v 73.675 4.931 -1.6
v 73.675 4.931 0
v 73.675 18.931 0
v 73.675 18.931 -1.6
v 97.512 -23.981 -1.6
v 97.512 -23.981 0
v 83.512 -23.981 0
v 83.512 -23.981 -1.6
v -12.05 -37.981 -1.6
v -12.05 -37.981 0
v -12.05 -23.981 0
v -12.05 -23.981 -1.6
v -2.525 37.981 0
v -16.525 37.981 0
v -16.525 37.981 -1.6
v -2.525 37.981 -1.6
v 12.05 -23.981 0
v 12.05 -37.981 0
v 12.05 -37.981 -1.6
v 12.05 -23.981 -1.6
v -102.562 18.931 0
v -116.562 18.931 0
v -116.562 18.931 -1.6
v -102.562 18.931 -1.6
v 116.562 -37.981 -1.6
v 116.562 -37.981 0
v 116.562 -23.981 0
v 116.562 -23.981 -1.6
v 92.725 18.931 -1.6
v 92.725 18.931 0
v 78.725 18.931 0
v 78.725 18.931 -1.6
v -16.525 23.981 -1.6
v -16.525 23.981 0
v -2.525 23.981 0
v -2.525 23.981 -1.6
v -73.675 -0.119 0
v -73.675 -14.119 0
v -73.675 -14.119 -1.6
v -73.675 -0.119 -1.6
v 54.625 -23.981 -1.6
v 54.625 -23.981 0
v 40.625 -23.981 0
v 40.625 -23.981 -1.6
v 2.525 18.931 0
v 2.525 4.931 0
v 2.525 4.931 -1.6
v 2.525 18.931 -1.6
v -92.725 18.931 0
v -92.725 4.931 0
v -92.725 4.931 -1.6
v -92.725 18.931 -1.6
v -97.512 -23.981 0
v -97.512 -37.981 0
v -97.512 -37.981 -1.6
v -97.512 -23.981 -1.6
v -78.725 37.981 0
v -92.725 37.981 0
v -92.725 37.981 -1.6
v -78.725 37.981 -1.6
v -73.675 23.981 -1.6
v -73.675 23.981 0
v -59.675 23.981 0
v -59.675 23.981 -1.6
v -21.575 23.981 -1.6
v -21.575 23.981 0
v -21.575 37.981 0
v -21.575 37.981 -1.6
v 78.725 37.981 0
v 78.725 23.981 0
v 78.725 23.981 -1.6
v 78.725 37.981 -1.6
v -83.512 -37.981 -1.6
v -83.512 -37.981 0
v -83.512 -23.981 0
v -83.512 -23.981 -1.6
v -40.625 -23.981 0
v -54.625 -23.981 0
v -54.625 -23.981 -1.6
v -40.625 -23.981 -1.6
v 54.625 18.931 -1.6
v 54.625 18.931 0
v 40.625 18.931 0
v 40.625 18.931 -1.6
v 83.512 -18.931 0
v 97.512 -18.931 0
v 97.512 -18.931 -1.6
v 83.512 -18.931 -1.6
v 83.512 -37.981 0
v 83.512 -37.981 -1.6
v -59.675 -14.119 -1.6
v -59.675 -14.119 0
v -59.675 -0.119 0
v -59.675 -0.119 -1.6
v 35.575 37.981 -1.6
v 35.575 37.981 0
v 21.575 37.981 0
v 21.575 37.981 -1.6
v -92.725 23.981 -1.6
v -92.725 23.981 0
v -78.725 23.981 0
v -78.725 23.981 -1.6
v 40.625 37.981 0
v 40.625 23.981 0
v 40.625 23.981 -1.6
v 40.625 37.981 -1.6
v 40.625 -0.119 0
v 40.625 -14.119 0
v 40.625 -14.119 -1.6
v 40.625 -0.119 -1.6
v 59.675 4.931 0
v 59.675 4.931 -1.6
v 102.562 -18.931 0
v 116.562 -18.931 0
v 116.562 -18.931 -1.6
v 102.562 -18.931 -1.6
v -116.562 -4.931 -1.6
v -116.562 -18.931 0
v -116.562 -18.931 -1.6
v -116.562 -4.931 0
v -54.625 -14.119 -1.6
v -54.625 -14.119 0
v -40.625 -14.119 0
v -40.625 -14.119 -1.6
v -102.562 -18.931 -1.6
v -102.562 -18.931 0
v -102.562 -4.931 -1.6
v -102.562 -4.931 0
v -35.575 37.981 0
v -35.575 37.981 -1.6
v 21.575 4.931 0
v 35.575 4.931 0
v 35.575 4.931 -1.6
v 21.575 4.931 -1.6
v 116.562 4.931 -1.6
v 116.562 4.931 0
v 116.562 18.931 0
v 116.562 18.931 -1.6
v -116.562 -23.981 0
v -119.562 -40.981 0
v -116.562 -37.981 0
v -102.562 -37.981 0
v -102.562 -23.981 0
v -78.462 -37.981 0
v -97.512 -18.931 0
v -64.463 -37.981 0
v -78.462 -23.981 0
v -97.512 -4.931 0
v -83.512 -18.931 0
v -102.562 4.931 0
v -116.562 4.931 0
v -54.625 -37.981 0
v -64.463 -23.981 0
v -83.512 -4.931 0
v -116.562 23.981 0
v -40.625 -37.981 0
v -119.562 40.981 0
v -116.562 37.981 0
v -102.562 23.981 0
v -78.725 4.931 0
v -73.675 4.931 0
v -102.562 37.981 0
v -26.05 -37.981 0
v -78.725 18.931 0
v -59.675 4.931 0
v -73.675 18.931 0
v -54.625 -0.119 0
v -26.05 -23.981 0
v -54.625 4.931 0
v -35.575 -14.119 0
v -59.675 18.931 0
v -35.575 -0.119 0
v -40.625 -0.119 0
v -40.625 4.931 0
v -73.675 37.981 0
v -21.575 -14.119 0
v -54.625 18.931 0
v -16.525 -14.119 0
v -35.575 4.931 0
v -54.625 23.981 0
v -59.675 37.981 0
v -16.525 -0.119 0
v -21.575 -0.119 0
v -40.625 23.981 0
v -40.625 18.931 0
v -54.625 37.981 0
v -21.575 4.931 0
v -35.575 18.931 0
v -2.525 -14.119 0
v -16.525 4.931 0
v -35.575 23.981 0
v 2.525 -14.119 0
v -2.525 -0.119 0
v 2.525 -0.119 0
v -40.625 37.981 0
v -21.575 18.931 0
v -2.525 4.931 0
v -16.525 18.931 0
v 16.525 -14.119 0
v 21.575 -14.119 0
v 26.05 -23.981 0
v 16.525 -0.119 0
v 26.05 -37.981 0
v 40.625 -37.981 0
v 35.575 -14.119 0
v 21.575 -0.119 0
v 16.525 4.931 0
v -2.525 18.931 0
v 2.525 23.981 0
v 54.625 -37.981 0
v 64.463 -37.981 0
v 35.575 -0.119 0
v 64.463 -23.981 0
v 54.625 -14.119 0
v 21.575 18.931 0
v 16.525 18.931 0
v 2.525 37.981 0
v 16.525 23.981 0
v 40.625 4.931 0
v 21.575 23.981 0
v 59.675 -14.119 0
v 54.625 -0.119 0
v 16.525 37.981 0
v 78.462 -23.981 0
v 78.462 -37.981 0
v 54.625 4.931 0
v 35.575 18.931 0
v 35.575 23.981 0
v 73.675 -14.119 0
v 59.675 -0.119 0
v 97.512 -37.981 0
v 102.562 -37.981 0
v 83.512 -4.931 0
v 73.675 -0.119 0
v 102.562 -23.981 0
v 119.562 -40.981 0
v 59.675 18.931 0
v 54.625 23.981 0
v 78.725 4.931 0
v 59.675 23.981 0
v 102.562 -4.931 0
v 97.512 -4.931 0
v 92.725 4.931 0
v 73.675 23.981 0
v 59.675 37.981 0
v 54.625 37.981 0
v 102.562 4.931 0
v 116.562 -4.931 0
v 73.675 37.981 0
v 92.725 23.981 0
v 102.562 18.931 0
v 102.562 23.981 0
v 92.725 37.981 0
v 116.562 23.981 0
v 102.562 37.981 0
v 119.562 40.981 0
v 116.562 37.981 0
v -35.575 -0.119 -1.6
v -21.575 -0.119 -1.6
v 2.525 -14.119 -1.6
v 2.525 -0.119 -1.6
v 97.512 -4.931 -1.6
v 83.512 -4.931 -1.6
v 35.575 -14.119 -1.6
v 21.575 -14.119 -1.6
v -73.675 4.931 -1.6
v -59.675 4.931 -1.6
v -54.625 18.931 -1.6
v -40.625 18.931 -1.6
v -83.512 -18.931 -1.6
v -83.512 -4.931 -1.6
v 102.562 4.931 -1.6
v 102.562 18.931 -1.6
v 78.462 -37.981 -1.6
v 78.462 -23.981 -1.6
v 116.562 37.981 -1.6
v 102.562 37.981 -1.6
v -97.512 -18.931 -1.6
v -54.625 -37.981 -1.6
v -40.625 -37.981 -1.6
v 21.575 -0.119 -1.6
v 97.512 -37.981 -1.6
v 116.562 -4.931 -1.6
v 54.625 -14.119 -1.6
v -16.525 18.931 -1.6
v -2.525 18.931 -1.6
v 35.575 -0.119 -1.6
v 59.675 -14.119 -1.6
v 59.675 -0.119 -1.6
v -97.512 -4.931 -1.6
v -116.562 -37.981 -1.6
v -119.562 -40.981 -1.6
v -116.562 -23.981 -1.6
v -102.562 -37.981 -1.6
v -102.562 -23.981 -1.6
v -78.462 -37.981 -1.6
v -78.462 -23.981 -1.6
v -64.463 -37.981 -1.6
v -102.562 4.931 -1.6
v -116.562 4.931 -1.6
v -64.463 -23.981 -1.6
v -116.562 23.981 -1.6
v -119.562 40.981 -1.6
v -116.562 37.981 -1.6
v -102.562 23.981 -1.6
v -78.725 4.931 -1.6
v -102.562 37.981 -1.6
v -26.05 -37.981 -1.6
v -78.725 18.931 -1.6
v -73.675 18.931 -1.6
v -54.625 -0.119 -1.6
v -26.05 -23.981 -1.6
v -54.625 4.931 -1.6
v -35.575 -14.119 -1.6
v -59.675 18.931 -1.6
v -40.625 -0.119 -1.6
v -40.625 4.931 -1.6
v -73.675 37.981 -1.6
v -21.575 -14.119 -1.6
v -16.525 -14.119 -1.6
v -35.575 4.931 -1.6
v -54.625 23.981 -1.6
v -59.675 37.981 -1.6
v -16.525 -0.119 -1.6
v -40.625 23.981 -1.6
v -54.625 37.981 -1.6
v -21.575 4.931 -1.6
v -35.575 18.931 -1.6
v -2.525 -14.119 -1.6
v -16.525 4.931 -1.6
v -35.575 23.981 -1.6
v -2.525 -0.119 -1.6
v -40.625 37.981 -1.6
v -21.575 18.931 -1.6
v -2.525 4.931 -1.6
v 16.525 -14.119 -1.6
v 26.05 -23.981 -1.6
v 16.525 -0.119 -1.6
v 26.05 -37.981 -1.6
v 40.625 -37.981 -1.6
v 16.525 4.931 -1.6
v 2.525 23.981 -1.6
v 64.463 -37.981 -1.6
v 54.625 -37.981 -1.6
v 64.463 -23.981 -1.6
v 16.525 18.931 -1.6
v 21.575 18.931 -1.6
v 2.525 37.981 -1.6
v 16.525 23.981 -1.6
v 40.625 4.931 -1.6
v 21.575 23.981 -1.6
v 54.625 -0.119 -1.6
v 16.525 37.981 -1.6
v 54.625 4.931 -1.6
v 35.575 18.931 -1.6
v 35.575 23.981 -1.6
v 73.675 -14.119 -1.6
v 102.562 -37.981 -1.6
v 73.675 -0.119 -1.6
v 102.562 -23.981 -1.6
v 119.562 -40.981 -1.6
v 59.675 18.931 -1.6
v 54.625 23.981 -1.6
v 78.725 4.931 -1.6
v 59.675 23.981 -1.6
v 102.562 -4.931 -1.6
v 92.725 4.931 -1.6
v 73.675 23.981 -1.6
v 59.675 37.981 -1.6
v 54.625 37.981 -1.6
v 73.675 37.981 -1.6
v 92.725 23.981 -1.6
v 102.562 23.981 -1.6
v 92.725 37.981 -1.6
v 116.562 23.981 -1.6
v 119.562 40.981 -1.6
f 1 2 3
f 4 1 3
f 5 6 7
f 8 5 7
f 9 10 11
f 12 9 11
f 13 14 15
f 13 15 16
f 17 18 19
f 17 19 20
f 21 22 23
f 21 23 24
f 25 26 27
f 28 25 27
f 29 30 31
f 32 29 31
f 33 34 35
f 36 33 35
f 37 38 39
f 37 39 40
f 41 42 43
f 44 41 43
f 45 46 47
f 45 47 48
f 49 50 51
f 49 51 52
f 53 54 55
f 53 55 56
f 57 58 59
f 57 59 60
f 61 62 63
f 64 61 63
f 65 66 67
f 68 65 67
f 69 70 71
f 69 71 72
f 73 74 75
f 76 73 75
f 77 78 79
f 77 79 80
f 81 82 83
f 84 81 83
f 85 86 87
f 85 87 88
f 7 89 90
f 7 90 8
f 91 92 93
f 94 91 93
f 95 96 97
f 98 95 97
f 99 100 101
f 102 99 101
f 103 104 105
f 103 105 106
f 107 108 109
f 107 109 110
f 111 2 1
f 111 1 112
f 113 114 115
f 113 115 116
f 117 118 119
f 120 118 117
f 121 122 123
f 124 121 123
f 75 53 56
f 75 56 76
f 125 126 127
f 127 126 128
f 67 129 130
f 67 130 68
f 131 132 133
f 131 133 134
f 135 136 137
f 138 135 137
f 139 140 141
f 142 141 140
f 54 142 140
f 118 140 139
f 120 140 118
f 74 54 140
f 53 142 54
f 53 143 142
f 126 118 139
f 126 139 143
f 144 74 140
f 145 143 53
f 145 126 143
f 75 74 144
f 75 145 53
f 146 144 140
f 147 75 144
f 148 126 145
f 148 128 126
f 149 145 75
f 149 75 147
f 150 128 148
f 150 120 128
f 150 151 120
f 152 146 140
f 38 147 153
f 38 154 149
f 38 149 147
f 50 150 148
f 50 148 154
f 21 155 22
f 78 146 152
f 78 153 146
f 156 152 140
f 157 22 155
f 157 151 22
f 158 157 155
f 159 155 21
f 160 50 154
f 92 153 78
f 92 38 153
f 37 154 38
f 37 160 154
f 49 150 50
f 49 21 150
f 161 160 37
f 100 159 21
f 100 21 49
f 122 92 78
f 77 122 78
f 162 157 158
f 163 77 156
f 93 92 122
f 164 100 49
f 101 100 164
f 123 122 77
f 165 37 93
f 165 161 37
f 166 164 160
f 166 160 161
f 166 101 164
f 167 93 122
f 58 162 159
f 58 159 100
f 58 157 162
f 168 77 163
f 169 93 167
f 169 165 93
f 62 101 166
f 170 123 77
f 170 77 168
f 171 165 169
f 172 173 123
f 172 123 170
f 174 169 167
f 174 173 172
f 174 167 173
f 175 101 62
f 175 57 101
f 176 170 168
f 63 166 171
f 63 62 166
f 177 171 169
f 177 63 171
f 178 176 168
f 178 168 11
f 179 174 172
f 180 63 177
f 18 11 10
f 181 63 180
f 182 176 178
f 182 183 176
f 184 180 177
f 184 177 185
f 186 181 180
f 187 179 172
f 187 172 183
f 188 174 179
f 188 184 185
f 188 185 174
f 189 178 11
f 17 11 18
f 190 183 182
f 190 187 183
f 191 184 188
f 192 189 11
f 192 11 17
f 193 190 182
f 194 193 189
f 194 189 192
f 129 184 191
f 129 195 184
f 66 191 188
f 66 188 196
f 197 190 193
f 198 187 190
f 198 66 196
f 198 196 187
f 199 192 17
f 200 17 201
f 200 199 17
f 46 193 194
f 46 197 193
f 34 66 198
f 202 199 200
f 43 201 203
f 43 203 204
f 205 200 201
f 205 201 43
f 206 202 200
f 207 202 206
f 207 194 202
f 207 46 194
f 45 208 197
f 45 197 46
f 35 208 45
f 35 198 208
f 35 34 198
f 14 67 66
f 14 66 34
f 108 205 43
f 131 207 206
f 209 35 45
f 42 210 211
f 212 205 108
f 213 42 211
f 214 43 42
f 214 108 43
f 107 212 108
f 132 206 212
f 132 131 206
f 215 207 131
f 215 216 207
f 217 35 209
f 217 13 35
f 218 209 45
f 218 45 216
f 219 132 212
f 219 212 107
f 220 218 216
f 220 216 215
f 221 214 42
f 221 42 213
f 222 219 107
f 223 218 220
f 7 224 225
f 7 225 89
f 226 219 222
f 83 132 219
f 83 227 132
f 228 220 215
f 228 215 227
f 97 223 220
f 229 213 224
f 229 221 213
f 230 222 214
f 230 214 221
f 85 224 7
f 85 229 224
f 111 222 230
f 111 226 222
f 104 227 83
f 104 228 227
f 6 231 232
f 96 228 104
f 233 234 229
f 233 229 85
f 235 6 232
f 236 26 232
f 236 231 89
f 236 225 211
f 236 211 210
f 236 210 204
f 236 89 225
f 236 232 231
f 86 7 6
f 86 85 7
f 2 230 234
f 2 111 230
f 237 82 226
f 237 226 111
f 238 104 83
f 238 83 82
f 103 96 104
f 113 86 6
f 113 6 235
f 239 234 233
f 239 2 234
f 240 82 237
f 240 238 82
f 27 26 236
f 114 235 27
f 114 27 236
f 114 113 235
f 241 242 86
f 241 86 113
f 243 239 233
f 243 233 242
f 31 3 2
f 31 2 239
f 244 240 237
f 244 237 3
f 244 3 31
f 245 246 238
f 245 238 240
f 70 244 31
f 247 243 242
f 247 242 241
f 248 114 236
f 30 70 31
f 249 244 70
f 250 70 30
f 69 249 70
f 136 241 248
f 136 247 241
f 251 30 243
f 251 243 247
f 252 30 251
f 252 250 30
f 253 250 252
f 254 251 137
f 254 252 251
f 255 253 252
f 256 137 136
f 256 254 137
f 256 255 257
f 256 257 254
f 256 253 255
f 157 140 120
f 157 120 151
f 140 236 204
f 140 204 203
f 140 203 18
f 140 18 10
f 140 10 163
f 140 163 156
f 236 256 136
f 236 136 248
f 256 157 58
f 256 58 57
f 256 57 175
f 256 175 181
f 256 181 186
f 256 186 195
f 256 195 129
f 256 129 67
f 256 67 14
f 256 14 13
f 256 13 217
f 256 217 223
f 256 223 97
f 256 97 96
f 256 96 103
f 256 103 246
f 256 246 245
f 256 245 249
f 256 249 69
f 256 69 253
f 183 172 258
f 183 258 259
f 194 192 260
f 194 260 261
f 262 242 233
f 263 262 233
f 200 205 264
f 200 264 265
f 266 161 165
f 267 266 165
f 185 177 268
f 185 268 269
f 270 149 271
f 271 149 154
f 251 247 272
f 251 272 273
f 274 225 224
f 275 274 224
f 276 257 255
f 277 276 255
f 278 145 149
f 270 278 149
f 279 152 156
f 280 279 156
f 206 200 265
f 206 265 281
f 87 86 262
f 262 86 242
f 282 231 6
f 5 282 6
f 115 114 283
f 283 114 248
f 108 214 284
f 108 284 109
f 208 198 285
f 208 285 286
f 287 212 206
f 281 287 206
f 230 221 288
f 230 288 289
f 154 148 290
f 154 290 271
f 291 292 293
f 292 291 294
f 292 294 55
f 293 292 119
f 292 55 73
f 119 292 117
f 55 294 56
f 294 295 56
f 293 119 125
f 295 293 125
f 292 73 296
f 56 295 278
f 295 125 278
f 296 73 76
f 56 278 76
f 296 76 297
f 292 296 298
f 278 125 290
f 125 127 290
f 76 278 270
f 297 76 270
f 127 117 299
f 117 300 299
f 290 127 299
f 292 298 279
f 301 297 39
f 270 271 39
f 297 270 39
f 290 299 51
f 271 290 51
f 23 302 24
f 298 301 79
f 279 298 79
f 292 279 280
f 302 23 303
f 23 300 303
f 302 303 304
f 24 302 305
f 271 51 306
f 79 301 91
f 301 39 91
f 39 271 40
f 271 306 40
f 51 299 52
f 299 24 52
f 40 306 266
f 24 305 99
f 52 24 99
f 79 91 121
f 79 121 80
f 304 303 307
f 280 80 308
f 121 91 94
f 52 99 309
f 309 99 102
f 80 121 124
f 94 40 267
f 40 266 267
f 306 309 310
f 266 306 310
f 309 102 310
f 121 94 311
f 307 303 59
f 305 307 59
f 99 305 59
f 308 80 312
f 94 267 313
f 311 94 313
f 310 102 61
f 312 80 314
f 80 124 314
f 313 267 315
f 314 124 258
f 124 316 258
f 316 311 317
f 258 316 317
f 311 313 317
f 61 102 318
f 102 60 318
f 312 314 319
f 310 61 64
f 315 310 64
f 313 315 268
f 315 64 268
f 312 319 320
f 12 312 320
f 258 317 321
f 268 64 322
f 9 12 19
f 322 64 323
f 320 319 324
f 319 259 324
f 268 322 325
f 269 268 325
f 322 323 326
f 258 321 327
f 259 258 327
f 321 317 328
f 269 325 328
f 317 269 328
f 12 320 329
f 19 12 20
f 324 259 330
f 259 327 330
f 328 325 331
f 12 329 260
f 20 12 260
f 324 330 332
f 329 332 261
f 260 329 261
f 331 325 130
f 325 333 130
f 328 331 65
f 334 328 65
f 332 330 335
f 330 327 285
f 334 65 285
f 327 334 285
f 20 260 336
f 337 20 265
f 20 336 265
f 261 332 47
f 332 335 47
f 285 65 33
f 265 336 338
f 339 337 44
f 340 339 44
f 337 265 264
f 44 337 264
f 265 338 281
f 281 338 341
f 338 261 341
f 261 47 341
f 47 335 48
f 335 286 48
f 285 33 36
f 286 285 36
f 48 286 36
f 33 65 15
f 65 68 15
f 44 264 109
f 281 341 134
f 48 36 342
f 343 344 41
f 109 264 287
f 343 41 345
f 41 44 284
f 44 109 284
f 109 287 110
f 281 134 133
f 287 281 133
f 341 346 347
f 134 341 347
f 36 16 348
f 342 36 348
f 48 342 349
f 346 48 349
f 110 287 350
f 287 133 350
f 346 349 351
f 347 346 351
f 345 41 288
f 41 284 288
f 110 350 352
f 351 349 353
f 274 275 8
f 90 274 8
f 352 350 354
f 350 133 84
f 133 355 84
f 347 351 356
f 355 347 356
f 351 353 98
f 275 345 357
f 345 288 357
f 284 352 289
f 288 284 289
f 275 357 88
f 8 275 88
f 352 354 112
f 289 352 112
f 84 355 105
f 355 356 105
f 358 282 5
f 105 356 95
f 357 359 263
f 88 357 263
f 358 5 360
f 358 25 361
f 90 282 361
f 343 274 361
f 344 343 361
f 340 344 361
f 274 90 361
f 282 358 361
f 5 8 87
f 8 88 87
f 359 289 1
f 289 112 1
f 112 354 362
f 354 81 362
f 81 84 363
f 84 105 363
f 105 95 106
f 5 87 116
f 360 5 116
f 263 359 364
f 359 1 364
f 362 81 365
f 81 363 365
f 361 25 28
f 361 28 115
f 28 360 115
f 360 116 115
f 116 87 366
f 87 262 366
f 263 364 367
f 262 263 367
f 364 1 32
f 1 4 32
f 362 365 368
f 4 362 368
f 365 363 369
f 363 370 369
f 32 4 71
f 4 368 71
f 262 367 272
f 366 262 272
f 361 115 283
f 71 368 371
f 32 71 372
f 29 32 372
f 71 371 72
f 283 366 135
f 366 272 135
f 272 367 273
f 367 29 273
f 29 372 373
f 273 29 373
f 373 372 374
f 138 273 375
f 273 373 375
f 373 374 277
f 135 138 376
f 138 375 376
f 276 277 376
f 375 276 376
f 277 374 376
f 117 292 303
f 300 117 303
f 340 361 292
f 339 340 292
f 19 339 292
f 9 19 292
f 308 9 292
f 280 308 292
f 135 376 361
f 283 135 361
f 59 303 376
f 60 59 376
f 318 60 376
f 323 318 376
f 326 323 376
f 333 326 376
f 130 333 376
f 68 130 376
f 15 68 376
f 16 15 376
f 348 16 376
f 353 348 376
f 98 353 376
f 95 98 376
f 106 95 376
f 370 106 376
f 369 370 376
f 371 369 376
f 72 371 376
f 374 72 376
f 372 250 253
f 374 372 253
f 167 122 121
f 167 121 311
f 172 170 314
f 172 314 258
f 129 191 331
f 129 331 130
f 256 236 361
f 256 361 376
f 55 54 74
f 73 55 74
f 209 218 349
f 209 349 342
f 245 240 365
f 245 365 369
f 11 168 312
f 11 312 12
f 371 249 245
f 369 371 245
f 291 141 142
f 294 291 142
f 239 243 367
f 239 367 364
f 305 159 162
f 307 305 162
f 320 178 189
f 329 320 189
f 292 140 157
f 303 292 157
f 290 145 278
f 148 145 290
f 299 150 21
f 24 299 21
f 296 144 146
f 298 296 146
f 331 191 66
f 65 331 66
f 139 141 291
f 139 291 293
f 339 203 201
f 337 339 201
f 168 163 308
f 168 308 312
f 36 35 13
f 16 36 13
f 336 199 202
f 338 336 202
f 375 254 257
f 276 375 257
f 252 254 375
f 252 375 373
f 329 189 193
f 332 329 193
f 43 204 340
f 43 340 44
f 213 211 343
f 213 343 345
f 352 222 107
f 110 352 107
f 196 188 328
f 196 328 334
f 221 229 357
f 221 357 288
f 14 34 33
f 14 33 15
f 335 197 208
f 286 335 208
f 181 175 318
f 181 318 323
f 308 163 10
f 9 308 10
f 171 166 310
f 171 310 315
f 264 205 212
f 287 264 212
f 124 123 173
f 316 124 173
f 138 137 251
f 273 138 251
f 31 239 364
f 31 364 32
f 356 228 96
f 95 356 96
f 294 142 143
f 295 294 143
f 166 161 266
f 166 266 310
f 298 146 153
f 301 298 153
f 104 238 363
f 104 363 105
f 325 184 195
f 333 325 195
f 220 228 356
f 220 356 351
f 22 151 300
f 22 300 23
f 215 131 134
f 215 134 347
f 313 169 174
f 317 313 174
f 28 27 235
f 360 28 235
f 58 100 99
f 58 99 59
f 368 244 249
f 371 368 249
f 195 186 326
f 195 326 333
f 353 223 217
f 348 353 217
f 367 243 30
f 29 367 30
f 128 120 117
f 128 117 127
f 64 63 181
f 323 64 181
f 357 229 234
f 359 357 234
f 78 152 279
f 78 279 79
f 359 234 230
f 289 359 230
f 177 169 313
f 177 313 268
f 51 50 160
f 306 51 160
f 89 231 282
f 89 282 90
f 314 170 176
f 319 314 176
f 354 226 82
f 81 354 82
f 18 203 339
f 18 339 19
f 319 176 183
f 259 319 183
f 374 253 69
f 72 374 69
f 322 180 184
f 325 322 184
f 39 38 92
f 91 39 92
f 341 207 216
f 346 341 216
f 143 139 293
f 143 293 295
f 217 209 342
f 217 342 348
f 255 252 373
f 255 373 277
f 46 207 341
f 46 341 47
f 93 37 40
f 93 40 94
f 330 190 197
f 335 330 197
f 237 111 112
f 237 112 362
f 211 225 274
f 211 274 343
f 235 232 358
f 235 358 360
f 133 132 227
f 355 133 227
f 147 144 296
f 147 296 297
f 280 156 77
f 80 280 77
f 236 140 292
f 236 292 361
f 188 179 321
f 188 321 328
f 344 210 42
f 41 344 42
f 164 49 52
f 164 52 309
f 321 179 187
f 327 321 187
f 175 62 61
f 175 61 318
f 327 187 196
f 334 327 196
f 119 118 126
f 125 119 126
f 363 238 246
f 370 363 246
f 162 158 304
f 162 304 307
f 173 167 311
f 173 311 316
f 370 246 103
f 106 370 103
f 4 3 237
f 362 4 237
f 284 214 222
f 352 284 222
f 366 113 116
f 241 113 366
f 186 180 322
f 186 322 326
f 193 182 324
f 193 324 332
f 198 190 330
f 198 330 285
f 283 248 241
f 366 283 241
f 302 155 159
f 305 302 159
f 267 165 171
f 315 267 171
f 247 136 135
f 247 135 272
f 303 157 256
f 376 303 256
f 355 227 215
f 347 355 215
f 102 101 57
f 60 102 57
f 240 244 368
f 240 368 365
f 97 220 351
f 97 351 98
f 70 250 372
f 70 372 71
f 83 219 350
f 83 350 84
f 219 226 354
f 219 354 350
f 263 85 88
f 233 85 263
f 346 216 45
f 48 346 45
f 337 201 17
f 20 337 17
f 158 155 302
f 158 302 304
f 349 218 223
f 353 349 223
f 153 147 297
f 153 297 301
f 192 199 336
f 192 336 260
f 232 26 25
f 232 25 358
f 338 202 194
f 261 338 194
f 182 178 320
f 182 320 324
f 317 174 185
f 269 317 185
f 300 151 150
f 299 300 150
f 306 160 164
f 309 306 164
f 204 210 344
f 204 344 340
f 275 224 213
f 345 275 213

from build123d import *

# Parameters (mm, degrees)
SKETCH036_W     = 119.5625
SKETCH036_H     = 81.9625
PAD015_DEPTH    = 1.6
SKETCH037_W     = 14
SKETCH037_H     = 14
POCKET022_DEPTH = 5
SKETCH038_W     = 14
SKETCH038_H     = 14
POCKET023_DEPTH = 5
SKETCH039_W     = 14
SKETCH039_H     = 14
POCKET024_DEPTH = 5


with BuildPart() as plate:
    # Sketch036 → Pad015 (new body)
    with BuildSketch(Plane.XY):
        with Locations((-59.78125, 0)):
            Rectangle(SKETCH036_W, SKETCH036_H)
    extrude(amount=-PAD015_DEPTH)

    # Sketch037 → Pocket022 (cut)
    with BuildSketch(Plane.XY):
        with Locations((-9.525, 30.98125)):
            Rectangle(SKETCH037_W, SKETCH037_H)
        with Locations((-28.575, 30.98125)):
            Rectangle(SKETCH037_W, SKETCH037_H)
        with Locations((-47.625, 30.98125)):
            Rectangle(SKETCH037_W, SKETCH037_H)
        with Locations((-66.675, 30.98125)):
            Rectangle(SKETCH037_W, SKETCH037_H)
        with Locations((-85.725, 30.98125)):
            Rectangle(SKETCH037_W, SKETCH037_H)
        with Locations((-85.725, 11.93125)):
            Rectangle(SKETCH037_W, SKETCH037_H)
        with Locations((-66.675, 11.93125)):
            Rectangle(SKETCH037_W, SKETCH037_H)
        with Locations((-9.525, 11.93125)):
            Rectangle(SKETCH037_W, SKETCH037_H)
        with Locations((-47.625, 11.93125)):
            Rectangle(SKETCH037_W, SKETCH037_H)
        with Locations((-28.575, 11.93125)):
            Rectangle(SKETCH037_W, SKETCH037_H)
        with Locations((-9.525, -7.11875)):
            Rectangle(SKETCH037_W, SKETCH037_H)
        with Locations((-28.575, -7.11875)):
            Rectangle(SKETCH037_W, SKETCH037_H)
        with Locations((-47.625, -7.11875)):
            Rectangle(SKETCH037_W, SKETCH037_H)
        with Locations((-66.675, -7.11875)):
            Rectangle(SKETCH037_W, SKETCH037_H)
    extrude(amount=-POCKET022_DEPTH, mode=Mode.SUBTRACT)

    # Sketch038 → Pocket023 (cut)
    with BuildSketch(Plane.XY):
        with Locations((-109.5625, 30.98125)):
            Rectangle(SKETCH038_W, SKETCH038_H)
        with Locations((-109.5625, 11.93125)):
            Rectangle(SKETCH038_W, SKETCH038_H)
        with Locations((-109.5625, -11.93125)):
            Rectangle(SKETCH038_W, SKETCH038_H)
        with Locations((-109.5625, -30.98125)):
            Rectangle(SKETCH038_W, SKETCH038_H)
        with Locations((-90.5125, -11.93125)):
            Rectangle(SKETCH038_W, SKETCH038_H)
        with Locations((-90.5125, -30.98125)):
            Rectangle(SKETCH038_W, SKETCH038_H)
        with Locations((-71.4625, -30.98125)):
            Rectangle(SKETCH038_W, SKETCH038_H)
    extrude(amount=-POCKET023_DEPTH, mode=Mode.SUBTRACT)

    # Sketch039 → Pocket024 (cut)
    with BuildSketch(Plane.XY):
        with Locations((-47.625, -30.98125)):
            Rectangle(SKETCH039_W, SKETCH039_H)
        with Locations((-19.05, -30.98125)):
            Rectangle(SKETCH039_W, SKETCH039_H)
    extrude(amount=-POCKET024_DEPTH, mode=Mode.SUBTRACT)


with BuildPart() as case_plate:
    # Part__Mirroring002: instance of plate
    add(plate.part.mirror(Plane(origin=(0, 0, 0), x_dir=(0, -1, 0), z_dir=(1, 0, 0))))

    # Fusion002: union plate
    add(plate.part)


solid = case_plate.part
